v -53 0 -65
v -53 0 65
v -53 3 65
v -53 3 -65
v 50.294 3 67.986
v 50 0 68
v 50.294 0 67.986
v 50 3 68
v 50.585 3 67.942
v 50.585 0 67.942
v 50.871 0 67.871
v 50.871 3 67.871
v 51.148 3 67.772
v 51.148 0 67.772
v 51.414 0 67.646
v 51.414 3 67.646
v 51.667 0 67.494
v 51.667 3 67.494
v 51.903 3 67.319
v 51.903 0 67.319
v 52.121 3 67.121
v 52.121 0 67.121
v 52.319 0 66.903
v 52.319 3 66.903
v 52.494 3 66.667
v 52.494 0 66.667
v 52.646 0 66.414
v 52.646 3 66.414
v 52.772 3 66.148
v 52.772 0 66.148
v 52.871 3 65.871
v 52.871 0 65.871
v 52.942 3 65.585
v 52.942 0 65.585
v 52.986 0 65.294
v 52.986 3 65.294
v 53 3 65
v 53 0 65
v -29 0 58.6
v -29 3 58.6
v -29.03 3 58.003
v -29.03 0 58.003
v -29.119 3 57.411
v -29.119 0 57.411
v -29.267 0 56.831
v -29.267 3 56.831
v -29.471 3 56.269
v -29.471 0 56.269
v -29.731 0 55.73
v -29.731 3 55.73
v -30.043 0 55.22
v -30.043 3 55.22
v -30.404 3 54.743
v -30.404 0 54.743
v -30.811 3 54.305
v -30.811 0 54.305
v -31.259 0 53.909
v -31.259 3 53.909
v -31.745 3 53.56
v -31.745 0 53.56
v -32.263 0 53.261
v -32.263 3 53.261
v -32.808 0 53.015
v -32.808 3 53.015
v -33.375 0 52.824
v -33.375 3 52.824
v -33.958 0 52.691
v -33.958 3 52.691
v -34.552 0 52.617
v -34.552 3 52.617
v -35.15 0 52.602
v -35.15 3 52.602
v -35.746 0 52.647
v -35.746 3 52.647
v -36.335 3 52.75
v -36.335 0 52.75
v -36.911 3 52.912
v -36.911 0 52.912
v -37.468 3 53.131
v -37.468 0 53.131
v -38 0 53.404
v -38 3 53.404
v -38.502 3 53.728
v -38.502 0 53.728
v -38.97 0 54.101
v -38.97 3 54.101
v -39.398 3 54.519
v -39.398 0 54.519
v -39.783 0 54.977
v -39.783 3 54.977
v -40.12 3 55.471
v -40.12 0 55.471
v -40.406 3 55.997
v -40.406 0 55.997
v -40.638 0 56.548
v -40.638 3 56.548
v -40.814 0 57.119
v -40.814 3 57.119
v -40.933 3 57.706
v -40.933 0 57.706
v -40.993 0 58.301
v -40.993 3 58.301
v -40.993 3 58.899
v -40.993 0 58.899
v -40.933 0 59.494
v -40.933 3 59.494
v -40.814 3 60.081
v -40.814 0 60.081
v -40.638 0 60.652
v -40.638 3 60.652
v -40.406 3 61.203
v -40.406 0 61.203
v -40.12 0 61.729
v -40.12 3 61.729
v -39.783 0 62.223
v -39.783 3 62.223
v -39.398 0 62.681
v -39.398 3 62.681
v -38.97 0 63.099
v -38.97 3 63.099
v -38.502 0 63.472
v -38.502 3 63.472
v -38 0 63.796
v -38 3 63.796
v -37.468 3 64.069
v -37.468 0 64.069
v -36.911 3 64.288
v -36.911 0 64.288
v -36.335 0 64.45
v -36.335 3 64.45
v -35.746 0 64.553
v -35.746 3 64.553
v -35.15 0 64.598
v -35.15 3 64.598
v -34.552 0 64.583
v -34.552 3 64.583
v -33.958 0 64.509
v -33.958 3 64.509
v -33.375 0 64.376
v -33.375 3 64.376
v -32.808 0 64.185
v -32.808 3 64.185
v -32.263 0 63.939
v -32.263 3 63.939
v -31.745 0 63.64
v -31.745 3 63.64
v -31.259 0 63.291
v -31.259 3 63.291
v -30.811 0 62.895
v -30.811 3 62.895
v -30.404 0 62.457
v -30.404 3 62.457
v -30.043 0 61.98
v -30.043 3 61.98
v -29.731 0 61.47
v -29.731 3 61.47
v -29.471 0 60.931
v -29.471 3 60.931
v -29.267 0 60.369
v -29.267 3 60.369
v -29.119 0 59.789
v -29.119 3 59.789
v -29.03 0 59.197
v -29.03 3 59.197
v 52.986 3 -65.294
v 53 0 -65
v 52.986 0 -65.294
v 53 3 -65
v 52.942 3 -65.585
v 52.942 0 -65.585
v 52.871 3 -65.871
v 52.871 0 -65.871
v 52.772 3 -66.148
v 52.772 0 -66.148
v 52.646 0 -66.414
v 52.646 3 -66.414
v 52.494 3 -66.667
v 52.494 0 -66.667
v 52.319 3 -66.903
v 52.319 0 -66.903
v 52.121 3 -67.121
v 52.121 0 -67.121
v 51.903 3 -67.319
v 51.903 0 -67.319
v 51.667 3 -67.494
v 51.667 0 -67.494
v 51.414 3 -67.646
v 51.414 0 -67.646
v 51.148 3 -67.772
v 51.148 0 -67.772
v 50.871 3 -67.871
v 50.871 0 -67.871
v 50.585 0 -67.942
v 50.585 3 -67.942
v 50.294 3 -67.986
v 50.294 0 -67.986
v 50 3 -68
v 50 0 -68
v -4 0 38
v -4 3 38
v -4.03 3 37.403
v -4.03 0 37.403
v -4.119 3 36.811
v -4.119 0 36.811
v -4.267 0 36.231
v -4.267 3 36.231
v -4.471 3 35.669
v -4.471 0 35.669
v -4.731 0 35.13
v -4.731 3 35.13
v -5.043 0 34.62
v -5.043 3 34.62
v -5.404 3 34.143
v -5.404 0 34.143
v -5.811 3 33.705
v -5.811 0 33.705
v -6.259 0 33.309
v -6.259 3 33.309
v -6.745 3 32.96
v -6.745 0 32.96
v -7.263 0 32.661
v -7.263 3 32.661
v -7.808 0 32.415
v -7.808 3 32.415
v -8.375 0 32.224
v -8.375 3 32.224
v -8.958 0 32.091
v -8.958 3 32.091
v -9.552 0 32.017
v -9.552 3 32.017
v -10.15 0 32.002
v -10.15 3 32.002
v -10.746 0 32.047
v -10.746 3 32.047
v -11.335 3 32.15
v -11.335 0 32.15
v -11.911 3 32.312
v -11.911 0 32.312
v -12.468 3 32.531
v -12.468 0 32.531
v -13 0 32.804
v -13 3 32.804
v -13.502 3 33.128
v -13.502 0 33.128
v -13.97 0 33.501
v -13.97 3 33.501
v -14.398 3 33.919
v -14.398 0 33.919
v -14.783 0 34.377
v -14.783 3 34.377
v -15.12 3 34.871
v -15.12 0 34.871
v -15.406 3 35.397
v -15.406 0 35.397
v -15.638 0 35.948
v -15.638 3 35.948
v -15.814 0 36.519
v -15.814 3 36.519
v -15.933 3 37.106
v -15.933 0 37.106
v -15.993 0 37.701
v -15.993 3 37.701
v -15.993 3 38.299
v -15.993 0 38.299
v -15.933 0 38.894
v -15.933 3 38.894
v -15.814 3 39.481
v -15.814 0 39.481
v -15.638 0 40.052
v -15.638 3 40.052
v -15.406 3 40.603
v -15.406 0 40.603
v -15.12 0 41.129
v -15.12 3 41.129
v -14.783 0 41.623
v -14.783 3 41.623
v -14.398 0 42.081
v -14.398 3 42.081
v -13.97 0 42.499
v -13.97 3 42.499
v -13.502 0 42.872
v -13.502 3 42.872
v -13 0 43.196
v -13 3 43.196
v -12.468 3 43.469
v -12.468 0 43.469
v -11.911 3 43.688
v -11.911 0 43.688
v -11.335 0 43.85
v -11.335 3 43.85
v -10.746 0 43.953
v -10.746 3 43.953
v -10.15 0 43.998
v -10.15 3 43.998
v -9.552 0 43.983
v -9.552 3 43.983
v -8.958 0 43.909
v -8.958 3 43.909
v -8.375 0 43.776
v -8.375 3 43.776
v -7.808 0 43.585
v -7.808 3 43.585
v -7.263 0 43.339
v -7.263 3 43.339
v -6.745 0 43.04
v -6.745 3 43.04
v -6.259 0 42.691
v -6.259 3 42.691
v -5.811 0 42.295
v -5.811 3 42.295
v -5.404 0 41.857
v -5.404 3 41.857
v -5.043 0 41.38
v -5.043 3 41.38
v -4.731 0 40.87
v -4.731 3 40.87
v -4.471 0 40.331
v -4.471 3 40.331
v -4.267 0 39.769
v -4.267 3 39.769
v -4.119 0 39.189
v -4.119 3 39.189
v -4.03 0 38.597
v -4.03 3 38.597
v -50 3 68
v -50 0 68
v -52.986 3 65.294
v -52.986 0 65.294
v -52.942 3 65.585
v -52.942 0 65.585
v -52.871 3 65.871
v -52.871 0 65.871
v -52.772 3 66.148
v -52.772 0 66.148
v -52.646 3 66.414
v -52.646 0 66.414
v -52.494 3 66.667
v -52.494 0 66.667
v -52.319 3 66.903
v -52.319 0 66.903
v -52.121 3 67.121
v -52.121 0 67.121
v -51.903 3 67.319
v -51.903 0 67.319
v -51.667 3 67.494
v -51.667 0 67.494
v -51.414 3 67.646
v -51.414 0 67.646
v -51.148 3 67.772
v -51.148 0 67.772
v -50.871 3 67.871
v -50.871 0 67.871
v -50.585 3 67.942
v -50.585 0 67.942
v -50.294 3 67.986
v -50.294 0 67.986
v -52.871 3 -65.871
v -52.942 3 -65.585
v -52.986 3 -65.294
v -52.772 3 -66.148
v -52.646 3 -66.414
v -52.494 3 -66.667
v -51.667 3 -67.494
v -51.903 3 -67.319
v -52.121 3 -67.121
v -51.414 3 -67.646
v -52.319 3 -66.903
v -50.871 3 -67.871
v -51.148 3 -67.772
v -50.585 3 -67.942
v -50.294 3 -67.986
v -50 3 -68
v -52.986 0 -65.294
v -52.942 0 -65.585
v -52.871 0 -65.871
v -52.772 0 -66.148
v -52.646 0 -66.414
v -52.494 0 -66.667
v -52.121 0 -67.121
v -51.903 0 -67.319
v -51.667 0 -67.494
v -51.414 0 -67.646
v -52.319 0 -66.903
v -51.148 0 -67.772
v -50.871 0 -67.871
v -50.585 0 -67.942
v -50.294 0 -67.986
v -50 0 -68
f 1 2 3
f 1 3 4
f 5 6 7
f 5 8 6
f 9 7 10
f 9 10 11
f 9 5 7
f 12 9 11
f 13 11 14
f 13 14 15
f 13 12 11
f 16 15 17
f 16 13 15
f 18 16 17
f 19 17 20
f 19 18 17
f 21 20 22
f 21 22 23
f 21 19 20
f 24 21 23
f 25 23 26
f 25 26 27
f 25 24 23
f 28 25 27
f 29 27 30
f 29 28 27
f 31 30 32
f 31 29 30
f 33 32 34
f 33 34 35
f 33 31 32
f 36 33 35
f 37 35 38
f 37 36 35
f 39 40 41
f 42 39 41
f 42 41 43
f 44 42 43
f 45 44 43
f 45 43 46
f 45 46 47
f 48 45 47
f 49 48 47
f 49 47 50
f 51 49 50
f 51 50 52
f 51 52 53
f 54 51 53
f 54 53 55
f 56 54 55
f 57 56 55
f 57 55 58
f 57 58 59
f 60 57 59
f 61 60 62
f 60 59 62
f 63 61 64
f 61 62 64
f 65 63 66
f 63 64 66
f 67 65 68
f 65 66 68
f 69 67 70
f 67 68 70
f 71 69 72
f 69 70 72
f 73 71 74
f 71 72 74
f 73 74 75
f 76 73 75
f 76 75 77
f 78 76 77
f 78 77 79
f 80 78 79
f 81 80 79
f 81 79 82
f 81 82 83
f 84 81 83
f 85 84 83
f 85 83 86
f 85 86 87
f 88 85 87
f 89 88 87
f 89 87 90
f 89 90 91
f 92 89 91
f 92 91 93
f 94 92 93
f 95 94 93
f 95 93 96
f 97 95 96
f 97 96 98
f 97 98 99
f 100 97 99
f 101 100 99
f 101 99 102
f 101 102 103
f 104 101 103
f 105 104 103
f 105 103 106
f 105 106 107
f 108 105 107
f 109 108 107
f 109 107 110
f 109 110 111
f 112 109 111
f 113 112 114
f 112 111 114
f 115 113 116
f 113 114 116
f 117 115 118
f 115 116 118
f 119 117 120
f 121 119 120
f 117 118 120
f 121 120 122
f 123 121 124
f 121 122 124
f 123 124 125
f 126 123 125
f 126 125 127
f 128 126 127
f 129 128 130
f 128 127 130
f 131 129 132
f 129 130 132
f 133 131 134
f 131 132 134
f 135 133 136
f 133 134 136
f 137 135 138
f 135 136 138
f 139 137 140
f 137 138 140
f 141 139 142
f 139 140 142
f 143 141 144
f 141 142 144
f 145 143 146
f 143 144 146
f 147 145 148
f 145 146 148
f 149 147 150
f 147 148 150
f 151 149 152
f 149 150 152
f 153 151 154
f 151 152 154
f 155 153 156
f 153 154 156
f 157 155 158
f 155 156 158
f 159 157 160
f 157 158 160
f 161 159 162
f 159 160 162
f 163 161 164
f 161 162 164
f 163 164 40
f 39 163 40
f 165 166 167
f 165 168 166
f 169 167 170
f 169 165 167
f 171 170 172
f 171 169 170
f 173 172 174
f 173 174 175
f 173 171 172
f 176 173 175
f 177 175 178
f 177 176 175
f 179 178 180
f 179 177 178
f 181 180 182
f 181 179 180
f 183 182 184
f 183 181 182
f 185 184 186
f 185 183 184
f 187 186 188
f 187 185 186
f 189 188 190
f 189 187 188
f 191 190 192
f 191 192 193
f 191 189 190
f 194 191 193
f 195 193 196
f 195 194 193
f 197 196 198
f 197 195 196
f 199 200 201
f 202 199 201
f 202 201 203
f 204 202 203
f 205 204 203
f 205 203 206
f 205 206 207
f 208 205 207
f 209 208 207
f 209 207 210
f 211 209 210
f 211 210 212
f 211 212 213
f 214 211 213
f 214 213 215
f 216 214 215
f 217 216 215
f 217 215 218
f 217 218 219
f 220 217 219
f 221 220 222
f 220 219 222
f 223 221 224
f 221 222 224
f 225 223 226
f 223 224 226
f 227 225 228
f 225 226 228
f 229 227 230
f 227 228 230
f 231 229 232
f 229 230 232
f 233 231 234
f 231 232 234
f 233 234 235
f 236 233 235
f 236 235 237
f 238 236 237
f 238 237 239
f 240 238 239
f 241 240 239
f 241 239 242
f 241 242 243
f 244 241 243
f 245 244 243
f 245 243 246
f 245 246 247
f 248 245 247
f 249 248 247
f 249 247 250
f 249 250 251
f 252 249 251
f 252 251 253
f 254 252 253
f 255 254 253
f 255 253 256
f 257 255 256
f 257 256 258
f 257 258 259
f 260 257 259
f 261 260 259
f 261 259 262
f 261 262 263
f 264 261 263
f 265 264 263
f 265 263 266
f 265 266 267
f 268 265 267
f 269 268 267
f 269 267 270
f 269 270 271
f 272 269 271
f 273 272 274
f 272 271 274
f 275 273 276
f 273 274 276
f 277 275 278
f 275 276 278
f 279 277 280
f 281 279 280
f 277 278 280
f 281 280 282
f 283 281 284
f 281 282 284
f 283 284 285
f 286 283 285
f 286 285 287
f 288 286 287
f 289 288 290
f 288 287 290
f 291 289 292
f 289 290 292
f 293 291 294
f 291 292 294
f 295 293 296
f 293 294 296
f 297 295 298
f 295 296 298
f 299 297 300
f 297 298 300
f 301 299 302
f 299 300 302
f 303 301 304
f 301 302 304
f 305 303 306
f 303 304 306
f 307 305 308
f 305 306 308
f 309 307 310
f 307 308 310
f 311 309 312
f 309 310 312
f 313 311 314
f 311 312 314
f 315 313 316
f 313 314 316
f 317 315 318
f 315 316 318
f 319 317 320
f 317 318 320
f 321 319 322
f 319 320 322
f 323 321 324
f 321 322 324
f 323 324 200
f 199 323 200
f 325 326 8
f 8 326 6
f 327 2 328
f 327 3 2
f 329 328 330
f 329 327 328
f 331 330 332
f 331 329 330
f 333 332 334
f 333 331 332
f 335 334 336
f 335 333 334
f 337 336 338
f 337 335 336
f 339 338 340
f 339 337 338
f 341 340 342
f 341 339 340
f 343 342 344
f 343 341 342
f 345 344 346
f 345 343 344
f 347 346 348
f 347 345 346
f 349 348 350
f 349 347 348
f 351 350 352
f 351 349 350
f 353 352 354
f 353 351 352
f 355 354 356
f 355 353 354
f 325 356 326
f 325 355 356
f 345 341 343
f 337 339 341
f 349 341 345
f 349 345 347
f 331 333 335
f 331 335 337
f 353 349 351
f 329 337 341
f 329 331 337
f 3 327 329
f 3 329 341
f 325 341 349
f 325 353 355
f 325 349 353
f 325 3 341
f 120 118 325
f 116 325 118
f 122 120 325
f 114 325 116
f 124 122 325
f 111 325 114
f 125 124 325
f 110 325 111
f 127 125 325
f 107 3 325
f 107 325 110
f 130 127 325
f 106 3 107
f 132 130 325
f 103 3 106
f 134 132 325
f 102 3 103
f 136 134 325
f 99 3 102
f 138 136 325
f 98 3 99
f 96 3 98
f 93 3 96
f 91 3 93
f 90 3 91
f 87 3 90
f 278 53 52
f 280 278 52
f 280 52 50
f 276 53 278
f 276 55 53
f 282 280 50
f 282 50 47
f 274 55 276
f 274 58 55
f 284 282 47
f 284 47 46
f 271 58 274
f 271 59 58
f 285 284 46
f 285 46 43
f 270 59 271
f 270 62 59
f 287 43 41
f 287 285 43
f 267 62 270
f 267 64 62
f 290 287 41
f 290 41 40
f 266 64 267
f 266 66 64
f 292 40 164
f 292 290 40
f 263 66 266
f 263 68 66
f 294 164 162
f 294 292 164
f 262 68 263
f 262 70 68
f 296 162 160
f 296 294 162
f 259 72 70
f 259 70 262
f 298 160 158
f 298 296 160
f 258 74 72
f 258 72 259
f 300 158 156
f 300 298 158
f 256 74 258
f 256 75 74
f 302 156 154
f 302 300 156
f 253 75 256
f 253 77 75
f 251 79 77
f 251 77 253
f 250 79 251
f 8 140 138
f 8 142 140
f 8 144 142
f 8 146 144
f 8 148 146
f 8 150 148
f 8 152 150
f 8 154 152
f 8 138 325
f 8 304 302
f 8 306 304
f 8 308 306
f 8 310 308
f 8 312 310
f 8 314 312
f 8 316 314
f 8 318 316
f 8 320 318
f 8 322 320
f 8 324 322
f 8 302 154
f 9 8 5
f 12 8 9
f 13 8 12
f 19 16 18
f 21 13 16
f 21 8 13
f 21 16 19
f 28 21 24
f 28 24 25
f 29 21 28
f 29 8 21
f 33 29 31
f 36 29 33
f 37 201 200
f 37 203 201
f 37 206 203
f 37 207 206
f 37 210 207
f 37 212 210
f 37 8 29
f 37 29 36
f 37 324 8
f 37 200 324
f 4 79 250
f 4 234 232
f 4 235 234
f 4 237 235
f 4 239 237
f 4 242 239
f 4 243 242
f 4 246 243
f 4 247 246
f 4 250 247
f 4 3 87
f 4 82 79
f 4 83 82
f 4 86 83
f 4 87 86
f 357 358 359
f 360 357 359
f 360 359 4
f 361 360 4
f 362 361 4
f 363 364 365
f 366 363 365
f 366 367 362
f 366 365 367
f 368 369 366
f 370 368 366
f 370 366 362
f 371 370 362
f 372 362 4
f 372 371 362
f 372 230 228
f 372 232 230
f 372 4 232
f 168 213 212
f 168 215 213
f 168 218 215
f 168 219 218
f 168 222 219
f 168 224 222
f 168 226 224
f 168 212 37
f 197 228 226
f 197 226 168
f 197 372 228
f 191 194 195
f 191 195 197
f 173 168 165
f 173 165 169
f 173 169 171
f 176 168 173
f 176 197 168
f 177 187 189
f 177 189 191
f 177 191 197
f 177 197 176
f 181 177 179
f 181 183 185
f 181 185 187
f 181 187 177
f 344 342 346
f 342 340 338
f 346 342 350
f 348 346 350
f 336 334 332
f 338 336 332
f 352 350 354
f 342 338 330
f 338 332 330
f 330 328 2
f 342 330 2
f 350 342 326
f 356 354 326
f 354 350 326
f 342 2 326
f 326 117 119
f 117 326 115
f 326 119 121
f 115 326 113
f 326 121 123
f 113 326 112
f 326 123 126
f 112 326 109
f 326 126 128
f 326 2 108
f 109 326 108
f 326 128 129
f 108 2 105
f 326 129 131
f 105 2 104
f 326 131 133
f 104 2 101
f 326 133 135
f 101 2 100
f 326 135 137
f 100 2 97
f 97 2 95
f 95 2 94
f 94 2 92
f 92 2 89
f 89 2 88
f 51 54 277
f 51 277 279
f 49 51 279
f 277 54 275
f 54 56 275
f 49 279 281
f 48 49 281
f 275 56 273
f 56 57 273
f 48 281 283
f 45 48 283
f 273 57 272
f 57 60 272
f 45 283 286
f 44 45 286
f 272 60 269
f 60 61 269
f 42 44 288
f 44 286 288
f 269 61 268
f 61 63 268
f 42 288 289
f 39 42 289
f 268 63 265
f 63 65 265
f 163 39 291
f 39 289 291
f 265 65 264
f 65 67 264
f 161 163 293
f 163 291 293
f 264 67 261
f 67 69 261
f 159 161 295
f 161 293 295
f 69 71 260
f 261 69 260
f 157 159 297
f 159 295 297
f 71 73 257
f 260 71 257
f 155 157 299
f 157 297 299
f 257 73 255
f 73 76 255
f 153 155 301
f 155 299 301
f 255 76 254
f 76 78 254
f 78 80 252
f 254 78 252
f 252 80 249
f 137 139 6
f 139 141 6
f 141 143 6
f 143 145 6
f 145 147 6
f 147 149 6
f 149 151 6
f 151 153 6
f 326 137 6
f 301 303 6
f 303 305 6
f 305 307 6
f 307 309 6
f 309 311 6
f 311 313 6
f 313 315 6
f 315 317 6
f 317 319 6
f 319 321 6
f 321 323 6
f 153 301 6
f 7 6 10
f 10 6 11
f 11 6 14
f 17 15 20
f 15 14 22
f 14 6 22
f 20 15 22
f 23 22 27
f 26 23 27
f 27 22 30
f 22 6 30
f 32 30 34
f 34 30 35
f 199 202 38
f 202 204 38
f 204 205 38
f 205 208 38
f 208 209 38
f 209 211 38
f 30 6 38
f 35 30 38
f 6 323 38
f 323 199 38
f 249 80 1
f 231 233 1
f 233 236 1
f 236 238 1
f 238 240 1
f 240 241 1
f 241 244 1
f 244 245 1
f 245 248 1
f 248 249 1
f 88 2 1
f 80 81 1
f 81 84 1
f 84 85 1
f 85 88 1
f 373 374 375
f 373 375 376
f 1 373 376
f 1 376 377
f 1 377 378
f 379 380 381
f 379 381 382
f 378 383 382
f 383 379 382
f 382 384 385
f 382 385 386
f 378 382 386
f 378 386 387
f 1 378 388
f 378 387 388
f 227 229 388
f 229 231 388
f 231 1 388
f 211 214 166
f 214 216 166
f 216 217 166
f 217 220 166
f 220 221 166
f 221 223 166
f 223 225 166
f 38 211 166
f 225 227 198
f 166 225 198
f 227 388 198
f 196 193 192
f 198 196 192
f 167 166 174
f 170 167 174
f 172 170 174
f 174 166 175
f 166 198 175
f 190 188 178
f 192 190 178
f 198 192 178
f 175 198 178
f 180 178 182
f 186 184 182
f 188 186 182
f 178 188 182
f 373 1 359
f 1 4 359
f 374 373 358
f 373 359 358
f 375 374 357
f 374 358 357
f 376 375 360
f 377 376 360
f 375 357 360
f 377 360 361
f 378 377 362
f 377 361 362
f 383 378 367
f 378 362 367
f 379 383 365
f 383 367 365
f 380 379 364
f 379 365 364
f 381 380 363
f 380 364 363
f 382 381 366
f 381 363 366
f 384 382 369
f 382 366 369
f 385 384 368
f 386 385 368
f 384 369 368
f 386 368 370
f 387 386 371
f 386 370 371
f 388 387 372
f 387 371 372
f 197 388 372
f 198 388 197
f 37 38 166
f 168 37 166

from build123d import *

# Parameters (mm, degrees)
ESQUISSE1_W             = 106
ESQUISSE1_H             = 136
BOSS_EXTRU_1_DEPTH      = 3
CONG_1_R                = 3
ESQUISSE2_R             = 6
ENL_V_MAT_EXTRU_1_DEPTH = 10


with BuildPart() as part:
    # Esquisse1 → Boss.-Extru.1 (new body)
    with BuildSketch(Plane(origin=(0, 0, 0), x_dir=(1, 0, 0), z_dir=(0, 1, 0))):
        Rectangle(ESQUISSE1_W, ESQUISSE1_H)
    extrude(amount=BOSS_EXTRU_1_DEPTH)

    # Congé1
    cong_1_edges = [part.edges().sort_by_distance(p)[0] for p in [
        (53, 1.5, 68),
        (-53, 1.5, 68),
        (-53, 1.5, -68),
        (53, 1.5, -68),
    ]]
    fillet(cong_1_edges, radius=CONG_1_R)

    # Esquisse2 → Enlèv. mat.-Extru.1 (cut)
    with BuildSketch(Plane(origin=(0, 3, 0), x_dir=(1, 0, 0), z_dir=(0, 1, 0))):
        with Locations((-35, -58.6)):
            Circle(ESQUISSE2_R)
        with Locations((-10, -38)):
            Circle(ESQUISSE2_R)
    extrude(amount=-ENL_V_MAT_EXTRU_1_DEPTH, mode=Mode.SUBTRACT)


solid = part.part
